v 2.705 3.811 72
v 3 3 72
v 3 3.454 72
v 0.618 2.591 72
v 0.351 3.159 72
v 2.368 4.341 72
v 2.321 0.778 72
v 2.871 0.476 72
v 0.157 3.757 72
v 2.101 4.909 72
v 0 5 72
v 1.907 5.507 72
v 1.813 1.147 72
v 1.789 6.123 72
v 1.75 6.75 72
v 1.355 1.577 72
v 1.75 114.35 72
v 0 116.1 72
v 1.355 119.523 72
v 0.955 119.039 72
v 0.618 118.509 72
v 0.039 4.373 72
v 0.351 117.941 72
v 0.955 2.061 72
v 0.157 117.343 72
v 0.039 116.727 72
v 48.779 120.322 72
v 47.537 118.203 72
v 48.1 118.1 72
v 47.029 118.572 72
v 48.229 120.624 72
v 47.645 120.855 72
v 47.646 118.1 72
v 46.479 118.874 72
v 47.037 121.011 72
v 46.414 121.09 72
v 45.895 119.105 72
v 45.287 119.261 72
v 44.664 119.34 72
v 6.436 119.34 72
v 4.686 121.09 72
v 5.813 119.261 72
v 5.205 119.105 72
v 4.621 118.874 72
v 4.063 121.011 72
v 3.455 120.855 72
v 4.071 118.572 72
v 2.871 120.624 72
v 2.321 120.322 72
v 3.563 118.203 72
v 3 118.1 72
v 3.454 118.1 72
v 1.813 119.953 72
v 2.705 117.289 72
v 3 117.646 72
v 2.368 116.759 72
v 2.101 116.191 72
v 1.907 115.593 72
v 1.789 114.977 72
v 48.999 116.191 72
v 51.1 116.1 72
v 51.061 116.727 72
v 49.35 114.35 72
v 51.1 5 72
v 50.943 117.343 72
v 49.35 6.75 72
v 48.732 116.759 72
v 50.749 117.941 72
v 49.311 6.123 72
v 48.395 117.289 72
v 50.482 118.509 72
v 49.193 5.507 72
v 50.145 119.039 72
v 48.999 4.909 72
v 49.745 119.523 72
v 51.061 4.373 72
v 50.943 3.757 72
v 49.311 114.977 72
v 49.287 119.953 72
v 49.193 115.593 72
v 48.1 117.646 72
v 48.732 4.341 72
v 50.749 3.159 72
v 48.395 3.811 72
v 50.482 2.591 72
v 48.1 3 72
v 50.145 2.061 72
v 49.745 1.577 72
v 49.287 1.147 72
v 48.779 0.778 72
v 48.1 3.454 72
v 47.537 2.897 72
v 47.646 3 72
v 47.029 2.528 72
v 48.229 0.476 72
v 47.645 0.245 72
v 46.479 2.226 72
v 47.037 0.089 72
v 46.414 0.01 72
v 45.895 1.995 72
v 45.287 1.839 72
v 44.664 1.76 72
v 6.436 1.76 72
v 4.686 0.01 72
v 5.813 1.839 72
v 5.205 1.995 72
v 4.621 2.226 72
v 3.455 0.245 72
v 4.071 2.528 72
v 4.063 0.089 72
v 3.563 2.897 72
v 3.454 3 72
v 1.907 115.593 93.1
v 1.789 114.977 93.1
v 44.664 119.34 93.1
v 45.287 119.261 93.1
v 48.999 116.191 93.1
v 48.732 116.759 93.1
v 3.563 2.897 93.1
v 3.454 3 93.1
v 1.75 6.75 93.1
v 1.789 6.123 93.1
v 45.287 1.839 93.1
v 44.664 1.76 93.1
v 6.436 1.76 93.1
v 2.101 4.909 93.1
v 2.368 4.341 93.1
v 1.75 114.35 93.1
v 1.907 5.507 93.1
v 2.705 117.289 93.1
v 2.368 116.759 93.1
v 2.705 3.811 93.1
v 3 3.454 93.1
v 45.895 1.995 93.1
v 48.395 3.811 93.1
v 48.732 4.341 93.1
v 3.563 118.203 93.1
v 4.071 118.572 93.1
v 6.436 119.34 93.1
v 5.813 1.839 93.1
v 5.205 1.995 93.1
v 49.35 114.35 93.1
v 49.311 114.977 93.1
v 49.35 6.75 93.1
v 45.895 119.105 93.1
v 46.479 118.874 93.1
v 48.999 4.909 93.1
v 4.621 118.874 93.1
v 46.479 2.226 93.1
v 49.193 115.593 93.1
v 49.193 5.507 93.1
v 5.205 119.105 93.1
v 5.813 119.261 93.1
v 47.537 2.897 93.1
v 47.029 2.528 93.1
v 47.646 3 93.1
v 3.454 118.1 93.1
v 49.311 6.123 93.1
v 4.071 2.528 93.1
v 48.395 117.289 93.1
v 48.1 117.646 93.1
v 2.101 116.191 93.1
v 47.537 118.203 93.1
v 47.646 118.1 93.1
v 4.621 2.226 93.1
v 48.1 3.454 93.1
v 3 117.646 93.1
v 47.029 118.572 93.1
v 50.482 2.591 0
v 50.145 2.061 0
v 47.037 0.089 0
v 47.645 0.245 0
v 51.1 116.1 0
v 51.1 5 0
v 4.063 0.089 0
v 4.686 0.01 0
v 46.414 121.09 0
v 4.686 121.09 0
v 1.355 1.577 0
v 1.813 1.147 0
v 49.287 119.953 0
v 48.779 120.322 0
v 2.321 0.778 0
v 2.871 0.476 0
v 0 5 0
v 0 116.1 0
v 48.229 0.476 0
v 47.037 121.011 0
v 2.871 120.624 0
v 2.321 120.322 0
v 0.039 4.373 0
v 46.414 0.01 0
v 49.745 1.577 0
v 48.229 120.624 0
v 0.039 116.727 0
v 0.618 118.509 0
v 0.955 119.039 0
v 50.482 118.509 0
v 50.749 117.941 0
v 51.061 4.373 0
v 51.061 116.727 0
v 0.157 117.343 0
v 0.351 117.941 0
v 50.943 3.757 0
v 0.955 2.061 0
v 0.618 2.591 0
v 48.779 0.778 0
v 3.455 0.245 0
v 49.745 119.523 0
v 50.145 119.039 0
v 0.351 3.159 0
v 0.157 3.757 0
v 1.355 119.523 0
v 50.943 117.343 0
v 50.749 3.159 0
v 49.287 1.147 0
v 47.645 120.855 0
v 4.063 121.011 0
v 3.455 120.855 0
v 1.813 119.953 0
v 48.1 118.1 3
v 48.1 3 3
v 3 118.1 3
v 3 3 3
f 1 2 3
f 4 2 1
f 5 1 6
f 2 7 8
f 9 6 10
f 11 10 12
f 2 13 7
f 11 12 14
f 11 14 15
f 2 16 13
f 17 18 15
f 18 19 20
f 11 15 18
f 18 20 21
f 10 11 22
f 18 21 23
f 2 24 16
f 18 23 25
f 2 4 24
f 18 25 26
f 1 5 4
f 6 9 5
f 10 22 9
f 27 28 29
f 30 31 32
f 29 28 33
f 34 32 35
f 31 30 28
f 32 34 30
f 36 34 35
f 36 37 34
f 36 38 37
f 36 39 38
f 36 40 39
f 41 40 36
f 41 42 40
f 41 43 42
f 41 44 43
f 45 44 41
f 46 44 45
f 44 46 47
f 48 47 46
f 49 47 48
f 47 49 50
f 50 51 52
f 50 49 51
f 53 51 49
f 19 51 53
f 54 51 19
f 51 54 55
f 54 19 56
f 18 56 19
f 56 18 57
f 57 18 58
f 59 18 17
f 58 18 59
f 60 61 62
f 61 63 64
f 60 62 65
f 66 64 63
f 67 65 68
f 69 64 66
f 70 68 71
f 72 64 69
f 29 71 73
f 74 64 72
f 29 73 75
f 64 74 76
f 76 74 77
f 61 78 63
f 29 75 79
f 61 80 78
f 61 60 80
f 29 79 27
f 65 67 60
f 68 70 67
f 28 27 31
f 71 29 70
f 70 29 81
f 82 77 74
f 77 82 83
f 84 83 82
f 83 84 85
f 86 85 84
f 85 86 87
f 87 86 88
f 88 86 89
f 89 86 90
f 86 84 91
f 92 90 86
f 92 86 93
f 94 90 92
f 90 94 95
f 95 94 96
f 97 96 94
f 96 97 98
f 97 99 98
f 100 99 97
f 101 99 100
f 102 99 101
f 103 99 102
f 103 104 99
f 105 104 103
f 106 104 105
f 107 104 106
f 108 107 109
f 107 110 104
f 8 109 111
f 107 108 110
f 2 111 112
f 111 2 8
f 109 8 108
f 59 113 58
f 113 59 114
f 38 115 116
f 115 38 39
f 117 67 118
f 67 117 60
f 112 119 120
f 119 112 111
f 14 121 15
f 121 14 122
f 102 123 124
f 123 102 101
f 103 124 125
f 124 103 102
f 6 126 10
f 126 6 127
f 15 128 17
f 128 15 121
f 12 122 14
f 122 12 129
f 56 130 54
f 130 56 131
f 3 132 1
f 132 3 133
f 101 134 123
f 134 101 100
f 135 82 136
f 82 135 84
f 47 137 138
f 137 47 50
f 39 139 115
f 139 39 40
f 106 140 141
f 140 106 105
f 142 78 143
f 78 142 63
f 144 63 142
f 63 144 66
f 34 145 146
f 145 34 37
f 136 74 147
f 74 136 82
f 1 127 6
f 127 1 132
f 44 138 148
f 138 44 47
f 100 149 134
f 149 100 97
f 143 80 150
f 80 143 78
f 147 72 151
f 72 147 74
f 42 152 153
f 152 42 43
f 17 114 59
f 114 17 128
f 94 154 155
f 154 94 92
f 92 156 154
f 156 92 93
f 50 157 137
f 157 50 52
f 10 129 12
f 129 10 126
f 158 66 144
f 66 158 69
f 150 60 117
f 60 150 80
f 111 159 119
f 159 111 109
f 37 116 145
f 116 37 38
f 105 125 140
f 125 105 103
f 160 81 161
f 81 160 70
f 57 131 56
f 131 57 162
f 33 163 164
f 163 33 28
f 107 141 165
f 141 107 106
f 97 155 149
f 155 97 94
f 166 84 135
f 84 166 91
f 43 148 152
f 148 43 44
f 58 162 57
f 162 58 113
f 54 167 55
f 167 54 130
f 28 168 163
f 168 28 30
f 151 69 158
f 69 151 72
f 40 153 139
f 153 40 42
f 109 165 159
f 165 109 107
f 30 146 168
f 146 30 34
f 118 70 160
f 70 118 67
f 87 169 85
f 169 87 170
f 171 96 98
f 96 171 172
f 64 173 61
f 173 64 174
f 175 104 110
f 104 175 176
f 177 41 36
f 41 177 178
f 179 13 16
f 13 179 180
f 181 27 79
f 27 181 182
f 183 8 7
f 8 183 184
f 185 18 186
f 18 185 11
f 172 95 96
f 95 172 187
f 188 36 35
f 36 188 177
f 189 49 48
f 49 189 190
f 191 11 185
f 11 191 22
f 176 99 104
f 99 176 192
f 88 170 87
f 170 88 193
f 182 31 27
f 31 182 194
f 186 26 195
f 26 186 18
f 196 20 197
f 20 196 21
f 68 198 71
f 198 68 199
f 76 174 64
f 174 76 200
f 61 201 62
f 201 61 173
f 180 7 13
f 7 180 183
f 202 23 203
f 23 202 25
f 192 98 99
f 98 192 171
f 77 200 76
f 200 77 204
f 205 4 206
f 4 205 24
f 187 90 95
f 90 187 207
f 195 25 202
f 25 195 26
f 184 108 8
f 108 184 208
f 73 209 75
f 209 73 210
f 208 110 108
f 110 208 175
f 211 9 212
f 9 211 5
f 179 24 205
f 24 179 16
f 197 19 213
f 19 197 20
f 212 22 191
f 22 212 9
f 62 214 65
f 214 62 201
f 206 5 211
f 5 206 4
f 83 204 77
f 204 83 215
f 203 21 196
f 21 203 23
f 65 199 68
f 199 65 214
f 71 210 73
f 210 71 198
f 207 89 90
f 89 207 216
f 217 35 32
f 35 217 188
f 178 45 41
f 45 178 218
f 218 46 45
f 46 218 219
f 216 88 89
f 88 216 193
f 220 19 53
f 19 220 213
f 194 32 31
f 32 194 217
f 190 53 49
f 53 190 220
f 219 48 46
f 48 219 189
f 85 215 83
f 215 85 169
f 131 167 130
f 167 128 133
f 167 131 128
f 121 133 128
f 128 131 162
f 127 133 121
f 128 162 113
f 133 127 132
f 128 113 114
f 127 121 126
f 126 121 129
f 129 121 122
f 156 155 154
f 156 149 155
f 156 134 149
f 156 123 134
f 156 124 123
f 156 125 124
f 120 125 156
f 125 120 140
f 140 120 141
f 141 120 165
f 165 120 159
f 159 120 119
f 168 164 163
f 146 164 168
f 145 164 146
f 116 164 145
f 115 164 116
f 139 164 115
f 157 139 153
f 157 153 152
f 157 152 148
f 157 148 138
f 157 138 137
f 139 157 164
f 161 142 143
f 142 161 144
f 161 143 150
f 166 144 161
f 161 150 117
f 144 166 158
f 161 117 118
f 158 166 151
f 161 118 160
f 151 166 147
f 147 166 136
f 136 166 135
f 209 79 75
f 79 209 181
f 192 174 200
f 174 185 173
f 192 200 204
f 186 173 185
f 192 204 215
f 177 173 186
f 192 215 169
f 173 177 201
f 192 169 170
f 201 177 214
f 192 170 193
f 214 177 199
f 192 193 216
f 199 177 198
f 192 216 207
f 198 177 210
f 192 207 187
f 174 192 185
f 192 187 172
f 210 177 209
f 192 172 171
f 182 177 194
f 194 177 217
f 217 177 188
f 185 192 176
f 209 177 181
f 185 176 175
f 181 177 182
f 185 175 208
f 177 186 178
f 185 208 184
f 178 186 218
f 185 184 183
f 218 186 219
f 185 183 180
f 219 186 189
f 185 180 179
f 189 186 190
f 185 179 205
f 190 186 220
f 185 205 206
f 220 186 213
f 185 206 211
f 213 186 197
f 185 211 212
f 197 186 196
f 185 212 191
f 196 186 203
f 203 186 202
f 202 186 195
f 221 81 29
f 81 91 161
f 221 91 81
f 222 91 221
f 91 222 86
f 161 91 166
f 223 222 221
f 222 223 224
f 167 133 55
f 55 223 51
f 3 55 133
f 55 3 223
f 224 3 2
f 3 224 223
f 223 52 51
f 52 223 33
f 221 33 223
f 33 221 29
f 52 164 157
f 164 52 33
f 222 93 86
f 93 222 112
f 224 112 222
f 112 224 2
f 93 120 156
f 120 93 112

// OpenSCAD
/* [Configurations] */
Object_Height = 90;
Object_Width = 45;
Object_Depth = 115;
Wall_Thickness = 3;// 5mm is good enough
Cover_Height = 25;

/* [hidden] */
$fn = 50;
Tolerance = 0.1;
Cover_Spacing = 0.5;
Rounded_Corner = 5;


caixa();


module caixa(){
    difference(){
    roundedcube(Object_Width + Tolerance + (Wall_Thickness * 2), Object_Depth + Tolerance + (Wall_Thickness * 2), Object_Height + Tolerance + Wall_Thickness, Rounded_Corner,Rounded_Corner,Rounded_Corner,Rounded_Corner);
    translate([Wall_Thickness, Wall_Thickness, Wall_Thickness]) cube([Object_Width + Tolerance, Object_Depth + Tolerance, Object_Height + Tolerance + 1]);
    // Recorte da tampa
    translate([0,-0,(Object_Height + 1) - Cover_Height + (Wall_Thickness * 2)]) tampa(Cover_Spacing);    
    }
    
}

module simbolo(rotation){
    union()
	{
		rotate([90,0,rotation]) resize([larguraLogo,alturaLogo,profundidadeLogo]) import("logo.stl");
	}
}

module tampa(folga){
    difference(){
    translate([-folga/2,-folga/2,0]) roundedcube(Object_Width + Tolerance + (Wall_Thickness * 2) + folga, Object_Depth + Tolerance + (Wall_Thickness * 2) + folga, Cover_Height, Rounded_Corner,Rounded_Corner,Rounded_Corner,Rounded_Corner);
    translate([(Wall_Thickness + folga)/2, (Wall_Thickness + folga) /2, -Wall_Thickness]) roundedcube(Object_Width + Tolerance + Wall_Thickness - folga, Object_Depth + Tolerance +Wall_Thickness - folga, Cover_Height , Rounded_Corner, Rounded_Corner, Rounded_Corner, Rounded_Corner);
    }
}

module cartas(){
#cube([Object_Width, Object_Depth, Object_Height]);
}

module roundedcube(xdim ,ydim ,zdim,rdim1, rdim2, rdim3, rdim4){
    hull(){
        translate([rdim1,rdim1,0]) cylinder(r=rdim1, h=zdim);
        translate([xdim-rdim2,rdim2,0]) cylinder(r=rdim2, h=zdim);

        translate([rdim3,ydim-rdim3,0]) cylinder(r=rdim3, h=zdim);
        translate([xdim-rdim4,ydim-rdim4,0]) cylinder(r=rdim4, h=zdim);
    }
}
